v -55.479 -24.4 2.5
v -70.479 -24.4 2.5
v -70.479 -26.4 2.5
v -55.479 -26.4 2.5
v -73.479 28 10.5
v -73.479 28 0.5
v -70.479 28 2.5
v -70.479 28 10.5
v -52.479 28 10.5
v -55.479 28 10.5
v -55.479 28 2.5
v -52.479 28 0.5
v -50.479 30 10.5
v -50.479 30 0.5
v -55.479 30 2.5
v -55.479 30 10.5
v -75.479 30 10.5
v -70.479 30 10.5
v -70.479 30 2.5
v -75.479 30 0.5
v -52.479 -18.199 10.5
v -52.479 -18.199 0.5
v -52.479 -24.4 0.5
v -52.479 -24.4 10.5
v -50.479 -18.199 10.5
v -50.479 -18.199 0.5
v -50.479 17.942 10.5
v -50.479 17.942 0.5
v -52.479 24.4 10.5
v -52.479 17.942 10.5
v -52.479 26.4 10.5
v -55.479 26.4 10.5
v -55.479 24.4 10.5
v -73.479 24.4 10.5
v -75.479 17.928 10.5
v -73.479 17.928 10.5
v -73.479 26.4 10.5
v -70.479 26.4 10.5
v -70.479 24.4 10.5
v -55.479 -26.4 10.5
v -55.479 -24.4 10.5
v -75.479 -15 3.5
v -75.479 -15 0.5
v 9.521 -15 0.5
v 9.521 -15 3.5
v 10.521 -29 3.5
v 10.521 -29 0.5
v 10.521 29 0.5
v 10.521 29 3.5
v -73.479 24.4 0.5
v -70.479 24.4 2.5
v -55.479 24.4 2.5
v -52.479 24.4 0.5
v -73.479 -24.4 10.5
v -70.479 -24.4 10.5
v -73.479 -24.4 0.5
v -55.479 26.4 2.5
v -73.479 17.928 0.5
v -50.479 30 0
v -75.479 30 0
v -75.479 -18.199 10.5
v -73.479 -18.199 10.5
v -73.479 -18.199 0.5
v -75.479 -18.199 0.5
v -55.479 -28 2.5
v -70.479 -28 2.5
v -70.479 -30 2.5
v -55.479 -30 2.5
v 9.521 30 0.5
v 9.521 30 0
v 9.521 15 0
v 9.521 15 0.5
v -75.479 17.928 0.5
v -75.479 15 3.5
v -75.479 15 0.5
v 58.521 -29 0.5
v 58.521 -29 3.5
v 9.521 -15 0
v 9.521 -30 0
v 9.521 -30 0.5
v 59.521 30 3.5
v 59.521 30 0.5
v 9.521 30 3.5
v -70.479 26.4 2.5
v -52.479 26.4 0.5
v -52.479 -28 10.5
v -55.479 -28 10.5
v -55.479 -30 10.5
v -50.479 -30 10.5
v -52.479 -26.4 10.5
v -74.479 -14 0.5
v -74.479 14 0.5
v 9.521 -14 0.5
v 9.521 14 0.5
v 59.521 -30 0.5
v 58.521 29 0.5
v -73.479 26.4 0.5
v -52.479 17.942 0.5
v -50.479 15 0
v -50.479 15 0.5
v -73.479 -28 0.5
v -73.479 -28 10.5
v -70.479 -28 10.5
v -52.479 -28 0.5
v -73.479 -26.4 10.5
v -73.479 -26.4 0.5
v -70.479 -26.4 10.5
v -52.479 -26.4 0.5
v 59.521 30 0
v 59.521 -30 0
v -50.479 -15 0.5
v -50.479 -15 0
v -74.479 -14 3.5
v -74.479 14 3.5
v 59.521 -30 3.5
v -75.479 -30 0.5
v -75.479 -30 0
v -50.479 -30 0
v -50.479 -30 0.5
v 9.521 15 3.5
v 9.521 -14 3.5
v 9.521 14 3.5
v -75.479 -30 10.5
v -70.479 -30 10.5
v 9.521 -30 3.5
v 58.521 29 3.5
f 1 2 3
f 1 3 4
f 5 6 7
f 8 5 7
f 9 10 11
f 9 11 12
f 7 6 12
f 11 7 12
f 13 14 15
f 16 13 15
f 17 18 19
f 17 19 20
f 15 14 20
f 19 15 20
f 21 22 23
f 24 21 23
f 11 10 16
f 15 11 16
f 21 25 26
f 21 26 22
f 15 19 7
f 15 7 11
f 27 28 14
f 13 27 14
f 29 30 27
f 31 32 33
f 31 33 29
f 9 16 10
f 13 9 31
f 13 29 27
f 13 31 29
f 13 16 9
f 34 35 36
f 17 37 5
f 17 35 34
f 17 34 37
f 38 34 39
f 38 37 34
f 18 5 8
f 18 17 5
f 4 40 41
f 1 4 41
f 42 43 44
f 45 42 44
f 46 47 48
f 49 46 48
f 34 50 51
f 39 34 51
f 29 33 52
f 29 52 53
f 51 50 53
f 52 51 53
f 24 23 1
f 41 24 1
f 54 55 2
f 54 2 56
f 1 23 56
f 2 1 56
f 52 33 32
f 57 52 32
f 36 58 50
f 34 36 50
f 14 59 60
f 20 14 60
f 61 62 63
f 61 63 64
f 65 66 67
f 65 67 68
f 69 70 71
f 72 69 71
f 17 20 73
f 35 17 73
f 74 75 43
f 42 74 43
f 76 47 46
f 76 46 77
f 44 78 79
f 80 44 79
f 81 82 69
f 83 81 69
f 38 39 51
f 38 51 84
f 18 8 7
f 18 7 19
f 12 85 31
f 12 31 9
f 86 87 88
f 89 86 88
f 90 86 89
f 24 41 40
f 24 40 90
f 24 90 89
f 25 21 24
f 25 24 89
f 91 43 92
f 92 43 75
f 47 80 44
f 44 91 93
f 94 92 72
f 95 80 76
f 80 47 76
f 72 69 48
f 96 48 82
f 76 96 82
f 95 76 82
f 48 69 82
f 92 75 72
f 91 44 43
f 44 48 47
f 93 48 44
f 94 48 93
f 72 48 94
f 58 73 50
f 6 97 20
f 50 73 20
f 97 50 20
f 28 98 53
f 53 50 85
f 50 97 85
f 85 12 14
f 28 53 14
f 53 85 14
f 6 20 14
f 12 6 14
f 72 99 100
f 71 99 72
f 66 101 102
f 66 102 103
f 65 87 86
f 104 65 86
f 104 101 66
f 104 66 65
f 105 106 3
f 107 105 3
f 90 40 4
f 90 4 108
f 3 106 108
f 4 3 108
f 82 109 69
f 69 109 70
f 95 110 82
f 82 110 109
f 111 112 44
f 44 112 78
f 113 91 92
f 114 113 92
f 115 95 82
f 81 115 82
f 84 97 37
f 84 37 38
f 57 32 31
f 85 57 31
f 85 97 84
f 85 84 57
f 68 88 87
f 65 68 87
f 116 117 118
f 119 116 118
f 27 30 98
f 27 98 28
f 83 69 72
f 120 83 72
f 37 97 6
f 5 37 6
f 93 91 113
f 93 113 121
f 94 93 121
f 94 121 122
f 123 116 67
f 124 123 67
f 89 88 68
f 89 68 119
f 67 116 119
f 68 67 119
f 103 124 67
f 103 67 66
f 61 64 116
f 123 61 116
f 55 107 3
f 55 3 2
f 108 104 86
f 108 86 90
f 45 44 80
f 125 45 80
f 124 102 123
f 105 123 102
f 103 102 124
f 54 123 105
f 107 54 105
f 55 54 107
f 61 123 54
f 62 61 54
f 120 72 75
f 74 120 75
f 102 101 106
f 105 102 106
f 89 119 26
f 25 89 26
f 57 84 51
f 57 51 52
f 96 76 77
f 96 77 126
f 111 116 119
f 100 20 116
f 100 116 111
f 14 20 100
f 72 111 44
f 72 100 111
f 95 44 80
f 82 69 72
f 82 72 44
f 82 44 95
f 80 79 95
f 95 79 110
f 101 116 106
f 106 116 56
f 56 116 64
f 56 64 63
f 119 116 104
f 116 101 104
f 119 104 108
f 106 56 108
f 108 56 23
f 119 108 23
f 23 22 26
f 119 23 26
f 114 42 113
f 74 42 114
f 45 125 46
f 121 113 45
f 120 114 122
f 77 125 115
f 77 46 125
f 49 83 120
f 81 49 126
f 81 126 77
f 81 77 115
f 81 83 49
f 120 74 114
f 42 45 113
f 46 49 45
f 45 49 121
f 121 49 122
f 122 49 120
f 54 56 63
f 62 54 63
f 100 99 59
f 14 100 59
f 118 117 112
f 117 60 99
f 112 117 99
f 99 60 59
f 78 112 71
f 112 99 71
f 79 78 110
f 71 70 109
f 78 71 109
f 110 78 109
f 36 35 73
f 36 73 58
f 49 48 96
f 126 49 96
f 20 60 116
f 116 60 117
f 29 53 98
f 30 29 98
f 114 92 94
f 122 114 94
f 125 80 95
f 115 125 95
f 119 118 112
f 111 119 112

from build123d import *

# Parameters (mm, degrees)
F0_W     = 60
F0_H     = 30
F1_DEPTH = 0.5
F2_W     = 84
F2_H     = 28
F2_W_2   = 48
F2_H_2   = 58
F3_DEPTH = 3
F4_W     = 21
F4_H     = 1.6
F5_DEPTH = 10
F6_W     = 15
F6_H     = 5.6
F7_DEPTH = 8
F8_W     = 15
F8_H     = 5.6
F9_DEPTH = 8


with BuildPart() as f1:
    # F0 (on Top) → F1 (new body)
    with BuildSketch(Plane.XY):
        with Locations((-20.479357, 0)):
            Rectangle(F0_W, F0_H)
        Polygon((-50.479357, -15), (-50.479357, 15), (-50.479357, 30), (-75.479357, 30), (-75.479357, -30), (-50.479357, -30), align=None)
        Polygon((9.520643, 30), (9.520643, 15), (9.520643, -15), (9.520643, -30), (59.520643, -30), (59.520643, 30), align=None)
    extrude(amount=F1_DEPTH)


with BuildPart() as f3:
    # F2 (on face) → F3 (new body)
    with BuildSketch(Plane.XY.offset(0.5)):
        Polygon((9.520643, 15), (-75.479357, 15), (-75.479357, -15), (9.520643, -15), (9.520643, -30), (59.520643, -30), (59.520643, 30), (9.520643, 30), align=None)
        with Locations((-32.479357, 0)):
            Rectangle(F2_W, F2_H, mode=Mode.SUBTRACT)
        with Locations((34.520643, 0)):
            Rectangle(F2_W_2, F2_H_2, mode=Mode.SUBTRACT)
    extrude(amount=F3_DEPTH)


with BuildPart() as f5:
    # F4 (on face) → F5 (new body)
    with BuildSketch(Plane.XY.offset(0.5)):
        Polygon((-75.479357, -18.199354), (-75.479357, -30), (-50.479357, -30), (-50.479357, -18.199354), (-52.479357, -18.199354), (-52.479357, -24.4), (-73.479357, -24.4), (-73.479357, -18.199354), align=None)
        with Locations((-62.979357, -27.2)):
            Rectangle(F4_W, F4_H, mode=Mode.SUBTRACT)
        Polygon((-50.479357, 30), (-75.479357, 30), (-75.479357, 17.928427), (-73.479357, 17.928427), (-73.479357, 24.4), (-52.479357, 24.4), (-52.479357, 17.941827), (-50.479357, 17.941827), align=None)
        with Locations((-62.979357, 27.2)):
            Rectangle(F4_W, F4_H, mode=Mode.SUBTRACT)
    extrude(amount=F5_DEPTH)

    # F6 (on face) → F7 (cut)
    with BuildSketch(Plane.XY.offset(10.5)):
        with Locations((-62.979357, 27.2)):
            Rectangle(F6_W, F6_H)
    extrude(amount=-F7_DEPTH, mode=Mode.SUBTRACT)

    # F8 (on face) → F9 (cut)
    with BuildSketch(Plane.XY.offset(10.5)):
        with Locations((-62.979357, -27.2)):
            Rectangle(F8_W, F8_H)
    extrude(amount=-F9_DEPTH, mode=Mode.SUBTRACT)


solid = Compound([f1.part, f3.part, f5.part])
